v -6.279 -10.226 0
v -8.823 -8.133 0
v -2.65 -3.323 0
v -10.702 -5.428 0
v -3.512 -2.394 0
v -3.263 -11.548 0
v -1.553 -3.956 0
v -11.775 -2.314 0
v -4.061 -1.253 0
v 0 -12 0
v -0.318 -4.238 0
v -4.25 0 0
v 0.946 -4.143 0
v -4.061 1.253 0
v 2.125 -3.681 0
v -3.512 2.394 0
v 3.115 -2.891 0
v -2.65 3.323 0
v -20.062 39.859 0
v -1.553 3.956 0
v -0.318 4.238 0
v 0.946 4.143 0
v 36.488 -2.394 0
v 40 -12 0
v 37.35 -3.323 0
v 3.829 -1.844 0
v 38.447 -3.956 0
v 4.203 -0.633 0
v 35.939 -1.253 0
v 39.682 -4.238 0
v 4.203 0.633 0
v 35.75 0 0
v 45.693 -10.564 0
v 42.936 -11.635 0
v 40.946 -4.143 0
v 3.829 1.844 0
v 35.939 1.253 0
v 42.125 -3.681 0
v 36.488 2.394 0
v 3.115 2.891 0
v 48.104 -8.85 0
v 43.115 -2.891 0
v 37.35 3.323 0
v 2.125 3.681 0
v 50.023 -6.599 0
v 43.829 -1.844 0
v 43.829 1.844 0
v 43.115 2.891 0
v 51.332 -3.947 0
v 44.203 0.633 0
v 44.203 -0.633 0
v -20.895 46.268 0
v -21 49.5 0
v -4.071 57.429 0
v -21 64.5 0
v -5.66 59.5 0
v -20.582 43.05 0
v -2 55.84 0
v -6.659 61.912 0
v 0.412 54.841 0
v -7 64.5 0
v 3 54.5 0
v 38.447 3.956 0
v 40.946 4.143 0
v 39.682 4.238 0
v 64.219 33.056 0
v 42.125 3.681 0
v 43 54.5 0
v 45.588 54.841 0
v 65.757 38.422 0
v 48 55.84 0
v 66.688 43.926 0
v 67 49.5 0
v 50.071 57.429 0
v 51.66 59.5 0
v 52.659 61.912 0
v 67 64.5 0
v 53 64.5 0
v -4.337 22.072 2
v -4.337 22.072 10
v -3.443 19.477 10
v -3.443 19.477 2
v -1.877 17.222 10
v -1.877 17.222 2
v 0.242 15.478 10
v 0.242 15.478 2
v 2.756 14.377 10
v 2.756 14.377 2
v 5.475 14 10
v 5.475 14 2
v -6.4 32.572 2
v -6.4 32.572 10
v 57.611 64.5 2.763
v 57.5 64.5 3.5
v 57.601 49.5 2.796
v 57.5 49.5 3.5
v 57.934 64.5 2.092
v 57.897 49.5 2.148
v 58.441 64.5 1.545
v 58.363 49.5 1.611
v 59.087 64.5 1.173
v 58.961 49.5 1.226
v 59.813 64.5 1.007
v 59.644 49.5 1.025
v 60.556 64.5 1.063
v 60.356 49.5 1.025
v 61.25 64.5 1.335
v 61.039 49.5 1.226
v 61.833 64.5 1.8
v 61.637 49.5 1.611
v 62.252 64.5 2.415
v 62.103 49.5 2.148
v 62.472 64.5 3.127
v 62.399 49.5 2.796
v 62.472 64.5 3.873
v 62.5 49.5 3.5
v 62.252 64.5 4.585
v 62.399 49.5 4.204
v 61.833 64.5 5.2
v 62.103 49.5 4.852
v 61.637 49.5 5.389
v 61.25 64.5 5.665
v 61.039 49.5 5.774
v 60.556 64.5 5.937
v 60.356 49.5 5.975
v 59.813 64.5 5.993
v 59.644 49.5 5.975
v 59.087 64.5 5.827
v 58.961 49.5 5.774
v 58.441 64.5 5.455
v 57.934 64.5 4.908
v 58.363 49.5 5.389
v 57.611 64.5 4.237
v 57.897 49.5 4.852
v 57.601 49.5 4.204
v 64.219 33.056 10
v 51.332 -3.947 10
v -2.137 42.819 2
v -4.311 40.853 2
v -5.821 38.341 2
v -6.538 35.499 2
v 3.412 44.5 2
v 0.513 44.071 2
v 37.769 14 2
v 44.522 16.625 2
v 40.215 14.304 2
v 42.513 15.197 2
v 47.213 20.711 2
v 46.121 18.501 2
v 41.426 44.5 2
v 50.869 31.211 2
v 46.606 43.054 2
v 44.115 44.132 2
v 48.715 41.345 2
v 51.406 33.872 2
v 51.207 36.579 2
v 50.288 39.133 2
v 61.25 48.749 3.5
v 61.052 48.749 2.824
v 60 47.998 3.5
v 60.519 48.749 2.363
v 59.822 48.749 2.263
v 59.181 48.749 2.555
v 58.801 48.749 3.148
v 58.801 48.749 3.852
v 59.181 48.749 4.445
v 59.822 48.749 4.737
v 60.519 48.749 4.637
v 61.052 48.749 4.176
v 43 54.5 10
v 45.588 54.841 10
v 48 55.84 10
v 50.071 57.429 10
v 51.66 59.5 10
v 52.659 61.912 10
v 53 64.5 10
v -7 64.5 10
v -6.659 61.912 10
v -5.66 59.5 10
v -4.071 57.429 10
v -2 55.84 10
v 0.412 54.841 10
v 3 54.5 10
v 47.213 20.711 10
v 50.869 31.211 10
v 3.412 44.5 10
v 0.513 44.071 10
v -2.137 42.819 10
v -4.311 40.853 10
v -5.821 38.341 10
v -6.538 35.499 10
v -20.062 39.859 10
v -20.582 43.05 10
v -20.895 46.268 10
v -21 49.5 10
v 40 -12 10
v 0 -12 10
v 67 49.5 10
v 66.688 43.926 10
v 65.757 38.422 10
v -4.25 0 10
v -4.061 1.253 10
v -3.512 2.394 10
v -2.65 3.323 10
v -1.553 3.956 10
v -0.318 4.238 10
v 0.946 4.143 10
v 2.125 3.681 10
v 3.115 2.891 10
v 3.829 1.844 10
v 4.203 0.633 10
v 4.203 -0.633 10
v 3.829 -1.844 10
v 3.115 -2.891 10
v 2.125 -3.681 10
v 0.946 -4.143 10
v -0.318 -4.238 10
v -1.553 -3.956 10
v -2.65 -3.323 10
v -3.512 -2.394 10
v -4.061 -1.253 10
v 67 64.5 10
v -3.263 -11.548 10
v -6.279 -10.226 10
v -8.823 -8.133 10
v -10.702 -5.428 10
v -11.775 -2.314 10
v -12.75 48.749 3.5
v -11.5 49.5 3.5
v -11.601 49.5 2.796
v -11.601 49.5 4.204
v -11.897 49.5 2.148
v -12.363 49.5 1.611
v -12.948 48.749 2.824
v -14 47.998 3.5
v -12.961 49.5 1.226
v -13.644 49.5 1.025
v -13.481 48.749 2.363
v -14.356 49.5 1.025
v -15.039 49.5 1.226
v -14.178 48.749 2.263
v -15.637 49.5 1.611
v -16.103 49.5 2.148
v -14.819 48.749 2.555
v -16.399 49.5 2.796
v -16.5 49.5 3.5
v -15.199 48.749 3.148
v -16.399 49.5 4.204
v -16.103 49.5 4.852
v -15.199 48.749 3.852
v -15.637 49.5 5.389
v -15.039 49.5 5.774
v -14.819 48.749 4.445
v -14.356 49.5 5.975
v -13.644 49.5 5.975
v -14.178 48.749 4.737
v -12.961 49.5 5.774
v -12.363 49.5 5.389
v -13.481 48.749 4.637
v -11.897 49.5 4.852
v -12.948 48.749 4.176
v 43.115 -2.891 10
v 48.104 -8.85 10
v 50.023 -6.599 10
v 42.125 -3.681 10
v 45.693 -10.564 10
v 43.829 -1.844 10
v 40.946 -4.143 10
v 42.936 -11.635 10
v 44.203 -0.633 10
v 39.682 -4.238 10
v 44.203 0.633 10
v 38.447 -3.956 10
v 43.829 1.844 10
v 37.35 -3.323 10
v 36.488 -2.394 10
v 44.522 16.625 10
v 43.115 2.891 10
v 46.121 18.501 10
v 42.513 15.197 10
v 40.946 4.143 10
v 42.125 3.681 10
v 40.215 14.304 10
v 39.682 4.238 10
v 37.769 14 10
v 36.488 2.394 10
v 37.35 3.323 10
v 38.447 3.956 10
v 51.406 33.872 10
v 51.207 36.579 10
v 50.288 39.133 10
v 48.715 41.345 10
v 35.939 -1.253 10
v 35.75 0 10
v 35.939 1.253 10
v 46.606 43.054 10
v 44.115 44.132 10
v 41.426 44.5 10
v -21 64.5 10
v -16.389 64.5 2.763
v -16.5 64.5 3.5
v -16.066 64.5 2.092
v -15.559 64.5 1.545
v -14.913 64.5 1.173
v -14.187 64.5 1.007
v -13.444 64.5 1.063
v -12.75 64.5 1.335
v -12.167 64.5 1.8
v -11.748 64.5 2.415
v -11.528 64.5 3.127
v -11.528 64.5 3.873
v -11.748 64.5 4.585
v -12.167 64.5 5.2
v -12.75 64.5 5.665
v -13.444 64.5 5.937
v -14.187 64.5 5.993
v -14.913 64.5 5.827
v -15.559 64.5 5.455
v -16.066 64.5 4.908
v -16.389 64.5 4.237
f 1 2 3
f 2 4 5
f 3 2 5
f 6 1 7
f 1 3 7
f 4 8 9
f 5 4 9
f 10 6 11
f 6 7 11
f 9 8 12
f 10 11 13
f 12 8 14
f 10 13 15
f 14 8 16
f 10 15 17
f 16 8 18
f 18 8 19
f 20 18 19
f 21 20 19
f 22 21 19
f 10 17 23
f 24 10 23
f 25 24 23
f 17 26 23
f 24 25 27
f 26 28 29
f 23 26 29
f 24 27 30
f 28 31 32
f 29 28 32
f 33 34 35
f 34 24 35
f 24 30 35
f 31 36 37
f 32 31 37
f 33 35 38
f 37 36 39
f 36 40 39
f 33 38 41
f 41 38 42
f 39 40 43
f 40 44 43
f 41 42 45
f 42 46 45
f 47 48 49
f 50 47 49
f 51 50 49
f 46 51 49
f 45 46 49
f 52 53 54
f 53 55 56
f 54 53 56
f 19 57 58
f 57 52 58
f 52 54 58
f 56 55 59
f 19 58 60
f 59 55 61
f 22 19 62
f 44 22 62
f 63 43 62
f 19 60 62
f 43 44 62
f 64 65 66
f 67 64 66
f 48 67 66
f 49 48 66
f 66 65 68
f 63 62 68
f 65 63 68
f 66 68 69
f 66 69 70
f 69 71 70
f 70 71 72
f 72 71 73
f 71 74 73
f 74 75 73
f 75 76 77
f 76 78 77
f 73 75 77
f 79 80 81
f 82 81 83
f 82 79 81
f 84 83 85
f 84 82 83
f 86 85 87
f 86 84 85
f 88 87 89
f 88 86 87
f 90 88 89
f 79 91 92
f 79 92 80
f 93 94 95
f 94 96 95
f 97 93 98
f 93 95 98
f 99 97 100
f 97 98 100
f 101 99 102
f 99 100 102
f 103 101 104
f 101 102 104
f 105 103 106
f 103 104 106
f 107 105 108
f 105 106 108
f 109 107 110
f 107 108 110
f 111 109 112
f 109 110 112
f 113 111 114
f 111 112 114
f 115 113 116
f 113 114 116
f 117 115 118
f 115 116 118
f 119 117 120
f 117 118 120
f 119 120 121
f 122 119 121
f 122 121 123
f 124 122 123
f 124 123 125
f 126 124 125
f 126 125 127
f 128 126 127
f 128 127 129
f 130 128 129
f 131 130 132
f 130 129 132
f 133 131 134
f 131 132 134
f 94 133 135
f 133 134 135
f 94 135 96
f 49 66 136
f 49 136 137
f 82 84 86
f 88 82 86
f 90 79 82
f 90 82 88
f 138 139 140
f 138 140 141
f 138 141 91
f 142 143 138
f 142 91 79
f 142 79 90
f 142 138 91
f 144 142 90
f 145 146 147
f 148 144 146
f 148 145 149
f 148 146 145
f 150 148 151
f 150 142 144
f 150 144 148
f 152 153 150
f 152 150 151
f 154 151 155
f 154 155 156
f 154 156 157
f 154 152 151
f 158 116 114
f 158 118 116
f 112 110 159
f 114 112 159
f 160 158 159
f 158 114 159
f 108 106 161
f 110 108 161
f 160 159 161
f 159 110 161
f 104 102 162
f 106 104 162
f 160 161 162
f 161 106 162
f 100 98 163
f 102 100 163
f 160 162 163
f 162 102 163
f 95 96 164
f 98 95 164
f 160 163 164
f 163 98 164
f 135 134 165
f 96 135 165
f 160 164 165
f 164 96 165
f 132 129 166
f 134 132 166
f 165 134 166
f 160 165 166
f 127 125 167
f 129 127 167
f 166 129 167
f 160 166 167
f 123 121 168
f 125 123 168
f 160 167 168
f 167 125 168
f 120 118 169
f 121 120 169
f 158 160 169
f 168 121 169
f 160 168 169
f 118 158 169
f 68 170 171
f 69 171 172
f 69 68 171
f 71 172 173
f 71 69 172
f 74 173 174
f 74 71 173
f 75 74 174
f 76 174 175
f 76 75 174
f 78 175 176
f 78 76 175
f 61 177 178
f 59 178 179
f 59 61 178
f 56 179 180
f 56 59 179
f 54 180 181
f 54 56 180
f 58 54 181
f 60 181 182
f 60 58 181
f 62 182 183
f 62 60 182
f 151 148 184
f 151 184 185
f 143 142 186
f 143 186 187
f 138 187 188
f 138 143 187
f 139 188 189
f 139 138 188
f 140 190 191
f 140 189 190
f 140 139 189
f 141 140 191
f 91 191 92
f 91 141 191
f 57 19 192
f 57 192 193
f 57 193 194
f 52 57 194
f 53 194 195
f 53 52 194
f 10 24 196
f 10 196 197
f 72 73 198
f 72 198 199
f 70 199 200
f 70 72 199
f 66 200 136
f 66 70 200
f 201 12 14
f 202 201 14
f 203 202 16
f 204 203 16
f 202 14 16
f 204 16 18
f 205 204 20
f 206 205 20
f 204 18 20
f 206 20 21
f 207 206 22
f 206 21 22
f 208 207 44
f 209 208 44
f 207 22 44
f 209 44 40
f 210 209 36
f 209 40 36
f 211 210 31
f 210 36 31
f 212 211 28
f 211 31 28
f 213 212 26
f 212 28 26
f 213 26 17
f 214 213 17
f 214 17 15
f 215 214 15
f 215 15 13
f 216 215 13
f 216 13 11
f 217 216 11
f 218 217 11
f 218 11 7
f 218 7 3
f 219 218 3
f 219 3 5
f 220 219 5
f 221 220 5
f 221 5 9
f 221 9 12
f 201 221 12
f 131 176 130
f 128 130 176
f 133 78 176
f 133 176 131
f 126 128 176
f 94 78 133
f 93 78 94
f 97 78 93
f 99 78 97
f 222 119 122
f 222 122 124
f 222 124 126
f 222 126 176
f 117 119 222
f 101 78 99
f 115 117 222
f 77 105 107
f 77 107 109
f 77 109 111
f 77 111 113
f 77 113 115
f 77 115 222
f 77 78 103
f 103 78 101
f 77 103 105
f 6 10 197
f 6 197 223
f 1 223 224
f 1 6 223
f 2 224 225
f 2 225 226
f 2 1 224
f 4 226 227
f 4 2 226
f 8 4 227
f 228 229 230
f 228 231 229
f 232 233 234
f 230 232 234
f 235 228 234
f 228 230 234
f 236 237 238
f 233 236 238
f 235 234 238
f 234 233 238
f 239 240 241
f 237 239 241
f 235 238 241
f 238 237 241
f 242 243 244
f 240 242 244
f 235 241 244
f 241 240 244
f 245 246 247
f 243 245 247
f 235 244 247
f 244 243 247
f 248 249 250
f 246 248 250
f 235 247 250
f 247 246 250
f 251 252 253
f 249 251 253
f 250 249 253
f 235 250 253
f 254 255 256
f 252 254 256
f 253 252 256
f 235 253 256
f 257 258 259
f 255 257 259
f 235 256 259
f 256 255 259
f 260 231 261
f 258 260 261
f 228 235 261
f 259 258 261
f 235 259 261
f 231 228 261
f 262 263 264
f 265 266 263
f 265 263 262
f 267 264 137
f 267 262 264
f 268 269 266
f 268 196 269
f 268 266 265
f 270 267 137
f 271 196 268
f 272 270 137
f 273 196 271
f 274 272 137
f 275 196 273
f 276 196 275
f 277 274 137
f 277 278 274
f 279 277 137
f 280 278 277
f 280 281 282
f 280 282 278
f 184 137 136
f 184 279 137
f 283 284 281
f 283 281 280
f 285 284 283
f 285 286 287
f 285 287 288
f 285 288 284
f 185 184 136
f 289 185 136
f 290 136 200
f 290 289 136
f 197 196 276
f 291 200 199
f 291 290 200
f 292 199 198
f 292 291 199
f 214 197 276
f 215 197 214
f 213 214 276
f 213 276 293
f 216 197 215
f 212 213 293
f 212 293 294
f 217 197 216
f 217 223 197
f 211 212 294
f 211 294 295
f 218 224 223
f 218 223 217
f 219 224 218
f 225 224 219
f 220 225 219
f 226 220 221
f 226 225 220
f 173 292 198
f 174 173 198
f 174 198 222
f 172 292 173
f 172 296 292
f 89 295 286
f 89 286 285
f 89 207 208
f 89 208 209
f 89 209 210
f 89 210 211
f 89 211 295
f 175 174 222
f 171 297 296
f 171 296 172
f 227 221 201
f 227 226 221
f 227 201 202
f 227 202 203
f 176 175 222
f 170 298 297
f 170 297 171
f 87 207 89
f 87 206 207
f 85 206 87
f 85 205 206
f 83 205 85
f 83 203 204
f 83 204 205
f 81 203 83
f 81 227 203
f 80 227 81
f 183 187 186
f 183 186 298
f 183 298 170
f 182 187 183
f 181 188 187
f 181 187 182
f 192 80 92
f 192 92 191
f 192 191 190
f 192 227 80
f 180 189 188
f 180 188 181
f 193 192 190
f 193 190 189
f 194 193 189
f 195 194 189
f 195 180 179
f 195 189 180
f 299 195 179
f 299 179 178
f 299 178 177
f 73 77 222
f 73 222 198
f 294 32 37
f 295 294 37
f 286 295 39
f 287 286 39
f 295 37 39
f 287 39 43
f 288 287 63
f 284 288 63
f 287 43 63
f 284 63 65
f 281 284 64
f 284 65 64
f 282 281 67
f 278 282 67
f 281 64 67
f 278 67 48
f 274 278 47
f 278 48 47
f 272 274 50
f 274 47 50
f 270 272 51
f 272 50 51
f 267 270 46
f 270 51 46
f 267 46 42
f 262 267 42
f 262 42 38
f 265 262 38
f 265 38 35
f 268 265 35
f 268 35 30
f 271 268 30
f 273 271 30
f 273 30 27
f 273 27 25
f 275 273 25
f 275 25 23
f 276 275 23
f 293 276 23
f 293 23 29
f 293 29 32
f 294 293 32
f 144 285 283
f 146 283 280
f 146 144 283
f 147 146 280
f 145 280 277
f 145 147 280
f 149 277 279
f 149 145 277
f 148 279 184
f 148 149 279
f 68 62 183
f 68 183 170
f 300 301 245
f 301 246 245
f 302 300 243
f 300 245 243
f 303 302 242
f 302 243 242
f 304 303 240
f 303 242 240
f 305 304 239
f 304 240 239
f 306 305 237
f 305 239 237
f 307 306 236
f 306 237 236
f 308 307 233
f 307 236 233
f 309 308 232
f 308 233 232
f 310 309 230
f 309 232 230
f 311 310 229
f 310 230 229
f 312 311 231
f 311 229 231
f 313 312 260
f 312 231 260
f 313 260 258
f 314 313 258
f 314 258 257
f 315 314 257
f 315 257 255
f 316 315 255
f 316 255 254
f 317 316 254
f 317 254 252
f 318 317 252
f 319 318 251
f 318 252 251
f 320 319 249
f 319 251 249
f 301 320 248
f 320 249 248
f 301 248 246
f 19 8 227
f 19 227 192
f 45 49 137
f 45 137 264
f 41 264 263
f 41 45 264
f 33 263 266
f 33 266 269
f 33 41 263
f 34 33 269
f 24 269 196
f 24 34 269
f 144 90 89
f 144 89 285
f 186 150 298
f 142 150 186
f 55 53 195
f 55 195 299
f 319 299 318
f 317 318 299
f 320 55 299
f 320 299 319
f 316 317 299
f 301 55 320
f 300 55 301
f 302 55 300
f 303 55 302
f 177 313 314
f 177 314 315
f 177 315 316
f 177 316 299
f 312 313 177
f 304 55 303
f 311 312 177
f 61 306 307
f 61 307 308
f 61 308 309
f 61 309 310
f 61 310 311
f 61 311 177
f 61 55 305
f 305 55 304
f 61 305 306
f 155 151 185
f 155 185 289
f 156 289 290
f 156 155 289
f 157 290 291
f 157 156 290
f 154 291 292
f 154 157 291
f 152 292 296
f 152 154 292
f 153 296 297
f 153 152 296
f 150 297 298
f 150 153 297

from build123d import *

# Parameters (mm, degrees)
SKETCH1_R                  = 4
BOSS_EXTRUDE1_DEPTH        = 12.7
CUT_EXTRUDE1_DEPTH         = 94.864476774
CUT_EXTRUDE1_DEPTH_BACK    = 94.864476774
SKETCH2_W                  = 2.7
SKETCH2_H                  = 29.5
M6X1_0_TAPPED_HOLE1_D      = 5
M6X1_0_TAPPED_HOLE1_DEPTH  = 15
M6X1_0_TAPPED_HOLE1_TIP    = 1.502151548
BOSS_EXTRUDE2_DEPTH        = 2
M10X1_5_TAPPED_HOLE1_D     = 8.5
M10X1_5_TAPPED_HOLE1_DEPTH = 10
CUT_EXTRUDE2_DEPTH         = 94.864476774
CUT_EXTRUDE2_DEPTH_BACK    = 94.864476774
SKETCH8_OUTSIDE_W          = 38.158
SKETCH8_OUTSIDE_H          = 101.958
SKETCH8_OUTSIDE_W_2        = 10
SKETCH8_OUTSIDE_H_2        = 76.5


with BuildPart() as part:
    # Sketch1 → Boss-Extrude1 (new body)
    with BuildSketch(Plane.XY):
        with BuildLine():
            Line((-21, 64.5), (-7, 64.5))
            ThreePointArc((-7, 64.5), (-4.071067812, 57.428932188), (3, 54.5))
            Line((3, 54.5), (43, 54.5))
            ThreePointArc((43, 54.5), (50.071067812, 57.428932188), (53, 64.5))
            Line((53, 64.5), (67, 64.5))
            Line((67, 64.5), (67, 49.5))
            ThreePointArc((67, 49.5), (66.299754559, 41.161283045), (64.218631982, 33.056132032))
            Line((64.218631982, 33.056132032), (51.332471676, -3.946528312))
            ThreePointArc((51.332471676, -3.946528312), (46.951318589, -9.781572975), (40, -12))
            Line((40, -12), (0, -12))
            ThreePointArc((0, -12), (-7.623489029, -9.26727657), (-11.77483021, -2.313735836))
            Line((-11.77483021, -2.313735836), (-20.061792543, 39.859434015))
            ThreePointArc((-20.061792543, 39.859434015), (-20.764895394, 44.656944514), (-21, 49.5))
            Line((-21, 49.5), (-21, 64.5))
        make_face()
        Circle(SKETCH1_R, mode=Mode.SUBTRACT)
        with Locations((40, 0)):
            Circle(SKETCH1_R, mode=Mode.SUBTRACT)
        with BuildLine():
            Line((-6.400325135, 32.571886803), (-4.337091454, 22.071886803))
            ThreePointArc((-4.337091454, 22.071886803), (-0.87764047, 16.277269525), (5.475267055, 14))
            Line((5.475267055, 14), (37.768949155, 14))
            ThreePointArc((37.768949155, 14), (43.561714646, 15.848689187), (47.212675552, 20.711226406))
            Line((47.212675552, 20.711226406), (50.869295966, 31.211226406))
            ThreePointArc((50.869295966, 31.211226406), (49.576880383, 40.292765491), (41.42556957, 44.5))
            Line((41.42556957, 44.5), (3.412033373, 44.5))
            ThreePointArc((3.412033373, 44.5), (-4.310697101, 40.852907524), (-6.400325135, 32.571886803))
        make_face(mode=Mode.SUBTRACT)
    extrude(amount=BOSS_EXTRUDE1_DEPTH)

    # Sketch2 → Cut-Extrude1 (cut, two sides: drawn at the far end of the back side and taken through both)
    with BuildSketch(Plane(origin=(0, 0, 0), x_dir=(0, 0, -1), z_dir=(1, 0, 0)).offset(-CUT_EXTRUDE1_DEPTH_BACK)):
        with Locations((-11.35, 2.75)):
            Rectangle(SKETCH2_W, SKETCH2_H)
    extrude(amount=CUT_EXTRUDE1_DEPTH + CUT_EXTRUDE1_DEPTH_BACK, mode=Mode.SUBTRACT)

    # M6x1.0 Tapped Hole1
    with Locations(Plane(origin=(0, 64.5, 0), x_dir=(1, 0, 0), z_dir=(0, 1, 0))):
        with Locations((-14, -3.5), (60, -3.5)):
            Hole(M6X1_0_TAPPED_HOLE1_D / 2, depth=M6X1_0_TAPPED_HOLE1_DEPTH)
            with Locations((0, 0, -(M6X1_0_TAPPED_HOLE1_DEPTH + M6X1_0_TAPPED_HOLE1_TIP / 2))):  # 118° drill point
                Cone(0, M6X1_0_TAPPED_HOLE1_D / 2, M6X1_0_TAPPED_HOLE1_TIP, mode=Mode.SUBTRACT)

    # Sketch5 → Boss-Extrude2 (add)
    with BuildSketch(Plane.XY):
        with BuildLine():
            Line((5.475267055, 14), (37.768949155, 14))
            ThreePointArc((37.768949155, 14), (43.561714646, 15.848689187), (47.212675552, 20.711226406))
            Line((47.212675552, 20.711226406), (50.869295966, 31.211226406))
            ThreePointArc((50.869295966, 31.211226406), (49.576880383, 40.292765491), (41.42556957, 44.5))
            Line((41.42556957, 44.5), (3.412033373, 44.5))
            ThreePointArc((3.412033373, 44.5), (-4.310697101, 40.852907524), (-6.400325135, 32.571886803))
            Line((-6.400325135, 32.571886803), (-4.337091454, 22.071886803))
            ThreePointArc((-4.337091454, 22.071886803), (-0.87764047, 16.277269525), (5.475267055, 14))
        make_face()
    extrude(amount=BOSS_EXTRUDE2_DEPTH)

    # M10x1.5 Tapped Hole1
    with Locations(Plane.XY.offset(10)):
        with Locations((0, 0), (40, 0)):
            Hole(M10X1_5_TAPPED_HOLE1_D / 2, depth=M10X1_5_TAPPED_HOLE1_DEPTH)

    # Sketch8 outside → Cut-Extrude2 (cut, two sides: drawn at the far end of the back side and taken through both)
    with BuildSketch(Plane(origin=(0, 0, 0), x_dir=(0, 0, -1), z_dir=(1, 0, 0)).offset(-CUT_EXTRUDE2_DEPTH_BACK)):
        with Locations((-6.35, 26.25)):
            Rectangle(SKETCH8_OUTSIDE_W, SKETCH8_OUTSIDE_H)
        with Locations((-5, 26.25)):
            Rectangle(SKETCH8_OUTSIDE_W_2, SKETCH8_OUTSIDE_H_2, mode=Mode.SUBTRACT)
    extrude(amount=CUT_EXTRUDE2_DEPTH + CUT_EXTRUDE2_DEPTH_BACK, mode=Mode.SUBTRACT)


solid = part.part
